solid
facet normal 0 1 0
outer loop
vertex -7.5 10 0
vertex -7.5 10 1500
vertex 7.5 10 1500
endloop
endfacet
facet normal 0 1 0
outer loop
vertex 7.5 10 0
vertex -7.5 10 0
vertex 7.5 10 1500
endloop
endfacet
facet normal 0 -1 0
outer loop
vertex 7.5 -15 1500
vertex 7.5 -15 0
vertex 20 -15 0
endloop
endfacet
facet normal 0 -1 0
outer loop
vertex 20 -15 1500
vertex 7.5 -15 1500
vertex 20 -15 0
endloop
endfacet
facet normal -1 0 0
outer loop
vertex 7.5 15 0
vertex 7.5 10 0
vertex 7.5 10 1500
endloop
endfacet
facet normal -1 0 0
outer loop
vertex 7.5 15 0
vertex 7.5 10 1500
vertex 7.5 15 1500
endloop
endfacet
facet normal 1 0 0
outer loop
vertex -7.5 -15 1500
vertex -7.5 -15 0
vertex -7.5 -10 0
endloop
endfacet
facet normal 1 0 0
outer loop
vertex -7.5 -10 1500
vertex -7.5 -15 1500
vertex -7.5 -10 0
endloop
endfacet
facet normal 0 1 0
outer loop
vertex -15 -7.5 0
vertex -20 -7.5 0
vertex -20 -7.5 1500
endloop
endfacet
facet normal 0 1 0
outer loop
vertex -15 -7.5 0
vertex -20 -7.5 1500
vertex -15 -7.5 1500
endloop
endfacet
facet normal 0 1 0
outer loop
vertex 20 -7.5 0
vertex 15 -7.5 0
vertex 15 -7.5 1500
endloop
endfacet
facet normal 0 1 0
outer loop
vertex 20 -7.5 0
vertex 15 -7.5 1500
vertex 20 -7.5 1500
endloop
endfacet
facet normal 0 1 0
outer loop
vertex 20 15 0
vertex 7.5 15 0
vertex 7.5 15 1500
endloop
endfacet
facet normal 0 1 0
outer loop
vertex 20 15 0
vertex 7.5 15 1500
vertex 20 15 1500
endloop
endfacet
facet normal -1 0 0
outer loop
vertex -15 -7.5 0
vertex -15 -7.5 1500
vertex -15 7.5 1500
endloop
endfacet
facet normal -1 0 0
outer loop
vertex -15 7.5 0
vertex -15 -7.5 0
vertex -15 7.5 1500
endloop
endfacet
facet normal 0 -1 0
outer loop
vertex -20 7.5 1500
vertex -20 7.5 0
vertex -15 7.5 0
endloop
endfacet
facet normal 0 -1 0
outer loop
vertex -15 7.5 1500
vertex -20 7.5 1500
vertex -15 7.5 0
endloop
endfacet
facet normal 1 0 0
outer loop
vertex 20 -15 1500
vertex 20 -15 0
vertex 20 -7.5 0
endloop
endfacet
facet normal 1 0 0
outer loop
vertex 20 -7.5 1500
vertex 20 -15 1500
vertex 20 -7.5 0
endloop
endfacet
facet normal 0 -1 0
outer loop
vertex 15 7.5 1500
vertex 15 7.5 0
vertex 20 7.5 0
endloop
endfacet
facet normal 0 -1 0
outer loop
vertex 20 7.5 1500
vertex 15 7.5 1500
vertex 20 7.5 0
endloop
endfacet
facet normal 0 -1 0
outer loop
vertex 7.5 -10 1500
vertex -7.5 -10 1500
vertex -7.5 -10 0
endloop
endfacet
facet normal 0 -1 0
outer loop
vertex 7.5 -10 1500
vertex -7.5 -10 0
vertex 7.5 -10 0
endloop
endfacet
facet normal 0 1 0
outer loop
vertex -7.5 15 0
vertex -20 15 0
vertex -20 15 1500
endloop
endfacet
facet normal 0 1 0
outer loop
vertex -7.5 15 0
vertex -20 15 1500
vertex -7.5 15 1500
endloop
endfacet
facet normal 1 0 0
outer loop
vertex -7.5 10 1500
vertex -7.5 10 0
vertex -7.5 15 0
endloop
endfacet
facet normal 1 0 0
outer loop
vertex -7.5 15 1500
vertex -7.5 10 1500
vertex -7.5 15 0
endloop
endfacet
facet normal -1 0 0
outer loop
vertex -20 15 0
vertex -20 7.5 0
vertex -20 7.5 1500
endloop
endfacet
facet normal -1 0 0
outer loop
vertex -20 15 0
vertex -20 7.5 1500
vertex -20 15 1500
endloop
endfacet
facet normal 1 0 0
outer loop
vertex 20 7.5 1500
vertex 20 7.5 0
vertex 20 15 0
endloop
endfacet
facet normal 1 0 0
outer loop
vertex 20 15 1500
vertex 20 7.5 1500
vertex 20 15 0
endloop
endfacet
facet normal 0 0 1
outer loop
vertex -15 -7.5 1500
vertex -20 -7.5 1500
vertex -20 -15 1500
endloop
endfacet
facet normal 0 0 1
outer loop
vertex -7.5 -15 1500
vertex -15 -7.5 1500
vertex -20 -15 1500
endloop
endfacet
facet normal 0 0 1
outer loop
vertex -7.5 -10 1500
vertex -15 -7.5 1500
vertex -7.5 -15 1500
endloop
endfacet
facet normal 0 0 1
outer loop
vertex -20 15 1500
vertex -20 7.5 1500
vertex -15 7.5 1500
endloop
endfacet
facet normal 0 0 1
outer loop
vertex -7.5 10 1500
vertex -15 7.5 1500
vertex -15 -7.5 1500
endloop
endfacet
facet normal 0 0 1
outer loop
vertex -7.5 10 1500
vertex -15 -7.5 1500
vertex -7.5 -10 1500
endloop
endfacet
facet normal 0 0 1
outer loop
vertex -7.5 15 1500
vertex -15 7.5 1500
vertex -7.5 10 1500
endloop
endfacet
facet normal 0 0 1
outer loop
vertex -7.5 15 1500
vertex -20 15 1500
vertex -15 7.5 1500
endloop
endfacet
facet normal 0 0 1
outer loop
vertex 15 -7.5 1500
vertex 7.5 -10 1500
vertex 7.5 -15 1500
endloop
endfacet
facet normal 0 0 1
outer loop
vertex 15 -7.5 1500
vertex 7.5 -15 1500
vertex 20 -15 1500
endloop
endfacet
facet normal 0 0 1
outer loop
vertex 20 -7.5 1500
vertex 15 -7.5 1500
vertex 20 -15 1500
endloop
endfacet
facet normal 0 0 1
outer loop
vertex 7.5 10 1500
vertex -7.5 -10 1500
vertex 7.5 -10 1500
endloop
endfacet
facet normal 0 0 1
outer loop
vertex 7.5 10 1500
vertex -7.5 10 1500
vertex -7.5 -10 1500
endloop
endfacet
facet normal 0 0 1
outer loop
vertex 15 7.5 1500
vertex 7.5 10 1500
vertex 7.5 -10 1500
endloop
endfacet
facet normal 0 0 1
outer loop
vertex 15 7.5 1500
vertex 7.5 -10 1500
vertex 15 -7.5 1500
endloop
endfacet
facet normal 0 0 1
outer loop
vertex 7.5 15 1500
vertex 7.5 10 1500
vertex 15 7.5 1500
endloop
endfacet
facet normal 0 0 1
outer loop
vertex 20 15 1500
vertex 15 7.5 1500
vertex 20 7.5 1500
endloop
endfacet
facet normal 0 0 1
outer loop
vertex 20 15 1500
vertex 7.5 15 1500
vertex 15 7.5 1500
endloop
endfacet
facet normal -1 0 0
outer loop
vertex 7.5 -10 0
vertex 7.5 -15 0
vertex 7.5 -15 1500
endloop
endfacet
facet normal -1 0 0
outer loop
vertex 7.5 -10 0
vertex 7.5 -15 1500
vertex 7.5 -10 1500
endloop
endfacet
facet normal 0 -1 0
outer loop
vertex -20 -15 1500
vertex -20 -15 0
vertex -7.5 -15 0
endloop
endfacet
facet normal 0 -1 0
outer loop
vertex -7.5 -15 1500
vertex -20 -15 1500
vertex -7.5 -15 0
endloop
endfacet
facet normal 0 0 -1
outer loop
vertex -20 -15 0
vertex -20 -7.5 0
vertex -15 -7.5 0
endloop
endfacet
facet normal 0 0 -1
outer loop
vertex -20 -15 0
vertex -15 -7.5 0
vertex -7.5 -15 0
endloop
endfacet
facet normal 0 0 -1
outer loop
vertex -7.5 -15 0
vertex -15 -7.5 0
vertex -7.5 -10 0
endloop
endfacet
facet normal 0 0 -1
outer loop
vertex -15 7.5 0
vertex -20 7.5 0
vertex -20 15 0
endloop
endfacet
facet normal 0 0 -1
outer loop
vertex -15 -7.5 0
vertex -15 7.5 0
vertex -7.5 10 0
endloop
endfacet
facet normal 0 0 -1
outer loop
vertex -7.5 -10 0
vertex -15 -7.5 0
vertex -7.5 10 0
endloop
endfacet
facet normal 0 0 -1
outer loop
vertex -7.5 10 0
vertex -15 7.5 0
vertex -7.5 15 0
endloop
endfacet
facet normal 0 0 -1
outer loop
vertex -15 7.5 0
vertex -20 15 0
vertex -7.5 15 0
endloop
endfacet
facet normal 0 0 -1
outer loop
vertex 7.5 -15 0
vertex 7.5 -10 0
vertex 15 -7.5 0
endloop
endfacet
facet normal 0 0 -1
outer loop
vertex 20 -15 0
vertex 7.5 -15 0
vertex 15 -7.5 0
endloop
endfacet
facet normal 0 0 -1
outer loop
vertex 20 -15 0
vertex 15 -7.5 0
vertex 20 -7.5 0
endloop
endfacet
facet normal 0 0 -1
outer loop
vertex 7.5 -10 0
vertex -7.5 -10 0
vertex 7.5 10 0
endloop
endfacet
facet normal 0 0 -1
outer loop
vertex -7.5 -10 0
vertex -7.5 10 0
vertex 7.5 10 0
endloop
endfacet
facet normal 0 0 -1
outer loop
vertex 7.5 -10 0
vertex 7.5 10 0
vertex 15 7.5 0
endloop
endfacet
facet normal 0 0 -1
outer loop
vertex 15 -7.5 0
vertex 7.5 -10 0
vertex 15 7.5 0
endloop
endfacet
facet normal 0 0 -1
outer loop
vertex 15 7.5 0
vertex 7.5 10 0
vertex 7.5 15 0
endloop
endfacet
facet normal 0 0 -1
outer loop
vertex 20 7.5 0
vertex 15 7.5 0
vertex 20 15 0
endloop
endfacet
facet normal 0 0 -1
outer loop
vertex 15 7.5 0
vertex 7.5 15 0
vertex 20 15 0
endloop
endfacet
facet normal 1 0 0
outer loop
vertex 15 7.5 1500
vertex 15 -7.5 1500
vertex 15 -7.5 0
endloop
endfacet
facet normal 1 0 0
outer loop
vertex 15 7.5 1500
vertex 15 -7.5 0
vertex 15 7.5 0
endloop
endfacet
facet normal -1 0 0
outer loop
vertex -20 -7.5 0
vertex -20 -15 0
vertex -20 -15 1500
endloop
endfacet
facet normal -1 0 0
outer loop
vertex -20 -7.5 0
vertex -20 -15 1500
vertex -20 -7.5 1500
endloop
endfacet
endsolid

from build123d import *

# Parameters (mm, degrees)
SKETCH2_W           = 40
SKETCH2_H           = 30
BOSS_EXTRUDE2_DEPTH = 1500
SKETCH3_W           = 15
SKETCH3_H           = 5
SKETCH3_W_2         = 5
SKETCH3_H_2         = 15
CUT_EXTRUDE1_DEPTH  = 1500


with BuildPart() as part:
    # Sketch2 → Boss-Extrude2 (new body)
    with BuildSketch(Plane.XY):
        Rectangle(SKETCH2_W, SKETCH2_H)
    extrude(amount=BOSS_EXTRUDE2_DEPTH)

    # Sketch3 → Cut-Extrude1 (cut)
    with BuildSketch(Plane.XY.offset(1500)):
        with Locations((0, 12.5)):
            Rectangle(SKETCH3_W, SKETCH3_H)
        with Locations((17.5, 0)):
            Rectangle(SKETCH3_W_2, SKETCH3_H_2)
        with Locations((0, -12.5)):
            Rectangle(SKETCH3_W, SKETCH3_H)
        with Locations((-17.5, 0)):
            Rectangle(SKETCH3_W_2, SKETCH3_H_2)
    extrude(amount=-CUT_EXTRUDE1_DEPTH, mode=Mode.SUBTRACT)


solid = part.part
